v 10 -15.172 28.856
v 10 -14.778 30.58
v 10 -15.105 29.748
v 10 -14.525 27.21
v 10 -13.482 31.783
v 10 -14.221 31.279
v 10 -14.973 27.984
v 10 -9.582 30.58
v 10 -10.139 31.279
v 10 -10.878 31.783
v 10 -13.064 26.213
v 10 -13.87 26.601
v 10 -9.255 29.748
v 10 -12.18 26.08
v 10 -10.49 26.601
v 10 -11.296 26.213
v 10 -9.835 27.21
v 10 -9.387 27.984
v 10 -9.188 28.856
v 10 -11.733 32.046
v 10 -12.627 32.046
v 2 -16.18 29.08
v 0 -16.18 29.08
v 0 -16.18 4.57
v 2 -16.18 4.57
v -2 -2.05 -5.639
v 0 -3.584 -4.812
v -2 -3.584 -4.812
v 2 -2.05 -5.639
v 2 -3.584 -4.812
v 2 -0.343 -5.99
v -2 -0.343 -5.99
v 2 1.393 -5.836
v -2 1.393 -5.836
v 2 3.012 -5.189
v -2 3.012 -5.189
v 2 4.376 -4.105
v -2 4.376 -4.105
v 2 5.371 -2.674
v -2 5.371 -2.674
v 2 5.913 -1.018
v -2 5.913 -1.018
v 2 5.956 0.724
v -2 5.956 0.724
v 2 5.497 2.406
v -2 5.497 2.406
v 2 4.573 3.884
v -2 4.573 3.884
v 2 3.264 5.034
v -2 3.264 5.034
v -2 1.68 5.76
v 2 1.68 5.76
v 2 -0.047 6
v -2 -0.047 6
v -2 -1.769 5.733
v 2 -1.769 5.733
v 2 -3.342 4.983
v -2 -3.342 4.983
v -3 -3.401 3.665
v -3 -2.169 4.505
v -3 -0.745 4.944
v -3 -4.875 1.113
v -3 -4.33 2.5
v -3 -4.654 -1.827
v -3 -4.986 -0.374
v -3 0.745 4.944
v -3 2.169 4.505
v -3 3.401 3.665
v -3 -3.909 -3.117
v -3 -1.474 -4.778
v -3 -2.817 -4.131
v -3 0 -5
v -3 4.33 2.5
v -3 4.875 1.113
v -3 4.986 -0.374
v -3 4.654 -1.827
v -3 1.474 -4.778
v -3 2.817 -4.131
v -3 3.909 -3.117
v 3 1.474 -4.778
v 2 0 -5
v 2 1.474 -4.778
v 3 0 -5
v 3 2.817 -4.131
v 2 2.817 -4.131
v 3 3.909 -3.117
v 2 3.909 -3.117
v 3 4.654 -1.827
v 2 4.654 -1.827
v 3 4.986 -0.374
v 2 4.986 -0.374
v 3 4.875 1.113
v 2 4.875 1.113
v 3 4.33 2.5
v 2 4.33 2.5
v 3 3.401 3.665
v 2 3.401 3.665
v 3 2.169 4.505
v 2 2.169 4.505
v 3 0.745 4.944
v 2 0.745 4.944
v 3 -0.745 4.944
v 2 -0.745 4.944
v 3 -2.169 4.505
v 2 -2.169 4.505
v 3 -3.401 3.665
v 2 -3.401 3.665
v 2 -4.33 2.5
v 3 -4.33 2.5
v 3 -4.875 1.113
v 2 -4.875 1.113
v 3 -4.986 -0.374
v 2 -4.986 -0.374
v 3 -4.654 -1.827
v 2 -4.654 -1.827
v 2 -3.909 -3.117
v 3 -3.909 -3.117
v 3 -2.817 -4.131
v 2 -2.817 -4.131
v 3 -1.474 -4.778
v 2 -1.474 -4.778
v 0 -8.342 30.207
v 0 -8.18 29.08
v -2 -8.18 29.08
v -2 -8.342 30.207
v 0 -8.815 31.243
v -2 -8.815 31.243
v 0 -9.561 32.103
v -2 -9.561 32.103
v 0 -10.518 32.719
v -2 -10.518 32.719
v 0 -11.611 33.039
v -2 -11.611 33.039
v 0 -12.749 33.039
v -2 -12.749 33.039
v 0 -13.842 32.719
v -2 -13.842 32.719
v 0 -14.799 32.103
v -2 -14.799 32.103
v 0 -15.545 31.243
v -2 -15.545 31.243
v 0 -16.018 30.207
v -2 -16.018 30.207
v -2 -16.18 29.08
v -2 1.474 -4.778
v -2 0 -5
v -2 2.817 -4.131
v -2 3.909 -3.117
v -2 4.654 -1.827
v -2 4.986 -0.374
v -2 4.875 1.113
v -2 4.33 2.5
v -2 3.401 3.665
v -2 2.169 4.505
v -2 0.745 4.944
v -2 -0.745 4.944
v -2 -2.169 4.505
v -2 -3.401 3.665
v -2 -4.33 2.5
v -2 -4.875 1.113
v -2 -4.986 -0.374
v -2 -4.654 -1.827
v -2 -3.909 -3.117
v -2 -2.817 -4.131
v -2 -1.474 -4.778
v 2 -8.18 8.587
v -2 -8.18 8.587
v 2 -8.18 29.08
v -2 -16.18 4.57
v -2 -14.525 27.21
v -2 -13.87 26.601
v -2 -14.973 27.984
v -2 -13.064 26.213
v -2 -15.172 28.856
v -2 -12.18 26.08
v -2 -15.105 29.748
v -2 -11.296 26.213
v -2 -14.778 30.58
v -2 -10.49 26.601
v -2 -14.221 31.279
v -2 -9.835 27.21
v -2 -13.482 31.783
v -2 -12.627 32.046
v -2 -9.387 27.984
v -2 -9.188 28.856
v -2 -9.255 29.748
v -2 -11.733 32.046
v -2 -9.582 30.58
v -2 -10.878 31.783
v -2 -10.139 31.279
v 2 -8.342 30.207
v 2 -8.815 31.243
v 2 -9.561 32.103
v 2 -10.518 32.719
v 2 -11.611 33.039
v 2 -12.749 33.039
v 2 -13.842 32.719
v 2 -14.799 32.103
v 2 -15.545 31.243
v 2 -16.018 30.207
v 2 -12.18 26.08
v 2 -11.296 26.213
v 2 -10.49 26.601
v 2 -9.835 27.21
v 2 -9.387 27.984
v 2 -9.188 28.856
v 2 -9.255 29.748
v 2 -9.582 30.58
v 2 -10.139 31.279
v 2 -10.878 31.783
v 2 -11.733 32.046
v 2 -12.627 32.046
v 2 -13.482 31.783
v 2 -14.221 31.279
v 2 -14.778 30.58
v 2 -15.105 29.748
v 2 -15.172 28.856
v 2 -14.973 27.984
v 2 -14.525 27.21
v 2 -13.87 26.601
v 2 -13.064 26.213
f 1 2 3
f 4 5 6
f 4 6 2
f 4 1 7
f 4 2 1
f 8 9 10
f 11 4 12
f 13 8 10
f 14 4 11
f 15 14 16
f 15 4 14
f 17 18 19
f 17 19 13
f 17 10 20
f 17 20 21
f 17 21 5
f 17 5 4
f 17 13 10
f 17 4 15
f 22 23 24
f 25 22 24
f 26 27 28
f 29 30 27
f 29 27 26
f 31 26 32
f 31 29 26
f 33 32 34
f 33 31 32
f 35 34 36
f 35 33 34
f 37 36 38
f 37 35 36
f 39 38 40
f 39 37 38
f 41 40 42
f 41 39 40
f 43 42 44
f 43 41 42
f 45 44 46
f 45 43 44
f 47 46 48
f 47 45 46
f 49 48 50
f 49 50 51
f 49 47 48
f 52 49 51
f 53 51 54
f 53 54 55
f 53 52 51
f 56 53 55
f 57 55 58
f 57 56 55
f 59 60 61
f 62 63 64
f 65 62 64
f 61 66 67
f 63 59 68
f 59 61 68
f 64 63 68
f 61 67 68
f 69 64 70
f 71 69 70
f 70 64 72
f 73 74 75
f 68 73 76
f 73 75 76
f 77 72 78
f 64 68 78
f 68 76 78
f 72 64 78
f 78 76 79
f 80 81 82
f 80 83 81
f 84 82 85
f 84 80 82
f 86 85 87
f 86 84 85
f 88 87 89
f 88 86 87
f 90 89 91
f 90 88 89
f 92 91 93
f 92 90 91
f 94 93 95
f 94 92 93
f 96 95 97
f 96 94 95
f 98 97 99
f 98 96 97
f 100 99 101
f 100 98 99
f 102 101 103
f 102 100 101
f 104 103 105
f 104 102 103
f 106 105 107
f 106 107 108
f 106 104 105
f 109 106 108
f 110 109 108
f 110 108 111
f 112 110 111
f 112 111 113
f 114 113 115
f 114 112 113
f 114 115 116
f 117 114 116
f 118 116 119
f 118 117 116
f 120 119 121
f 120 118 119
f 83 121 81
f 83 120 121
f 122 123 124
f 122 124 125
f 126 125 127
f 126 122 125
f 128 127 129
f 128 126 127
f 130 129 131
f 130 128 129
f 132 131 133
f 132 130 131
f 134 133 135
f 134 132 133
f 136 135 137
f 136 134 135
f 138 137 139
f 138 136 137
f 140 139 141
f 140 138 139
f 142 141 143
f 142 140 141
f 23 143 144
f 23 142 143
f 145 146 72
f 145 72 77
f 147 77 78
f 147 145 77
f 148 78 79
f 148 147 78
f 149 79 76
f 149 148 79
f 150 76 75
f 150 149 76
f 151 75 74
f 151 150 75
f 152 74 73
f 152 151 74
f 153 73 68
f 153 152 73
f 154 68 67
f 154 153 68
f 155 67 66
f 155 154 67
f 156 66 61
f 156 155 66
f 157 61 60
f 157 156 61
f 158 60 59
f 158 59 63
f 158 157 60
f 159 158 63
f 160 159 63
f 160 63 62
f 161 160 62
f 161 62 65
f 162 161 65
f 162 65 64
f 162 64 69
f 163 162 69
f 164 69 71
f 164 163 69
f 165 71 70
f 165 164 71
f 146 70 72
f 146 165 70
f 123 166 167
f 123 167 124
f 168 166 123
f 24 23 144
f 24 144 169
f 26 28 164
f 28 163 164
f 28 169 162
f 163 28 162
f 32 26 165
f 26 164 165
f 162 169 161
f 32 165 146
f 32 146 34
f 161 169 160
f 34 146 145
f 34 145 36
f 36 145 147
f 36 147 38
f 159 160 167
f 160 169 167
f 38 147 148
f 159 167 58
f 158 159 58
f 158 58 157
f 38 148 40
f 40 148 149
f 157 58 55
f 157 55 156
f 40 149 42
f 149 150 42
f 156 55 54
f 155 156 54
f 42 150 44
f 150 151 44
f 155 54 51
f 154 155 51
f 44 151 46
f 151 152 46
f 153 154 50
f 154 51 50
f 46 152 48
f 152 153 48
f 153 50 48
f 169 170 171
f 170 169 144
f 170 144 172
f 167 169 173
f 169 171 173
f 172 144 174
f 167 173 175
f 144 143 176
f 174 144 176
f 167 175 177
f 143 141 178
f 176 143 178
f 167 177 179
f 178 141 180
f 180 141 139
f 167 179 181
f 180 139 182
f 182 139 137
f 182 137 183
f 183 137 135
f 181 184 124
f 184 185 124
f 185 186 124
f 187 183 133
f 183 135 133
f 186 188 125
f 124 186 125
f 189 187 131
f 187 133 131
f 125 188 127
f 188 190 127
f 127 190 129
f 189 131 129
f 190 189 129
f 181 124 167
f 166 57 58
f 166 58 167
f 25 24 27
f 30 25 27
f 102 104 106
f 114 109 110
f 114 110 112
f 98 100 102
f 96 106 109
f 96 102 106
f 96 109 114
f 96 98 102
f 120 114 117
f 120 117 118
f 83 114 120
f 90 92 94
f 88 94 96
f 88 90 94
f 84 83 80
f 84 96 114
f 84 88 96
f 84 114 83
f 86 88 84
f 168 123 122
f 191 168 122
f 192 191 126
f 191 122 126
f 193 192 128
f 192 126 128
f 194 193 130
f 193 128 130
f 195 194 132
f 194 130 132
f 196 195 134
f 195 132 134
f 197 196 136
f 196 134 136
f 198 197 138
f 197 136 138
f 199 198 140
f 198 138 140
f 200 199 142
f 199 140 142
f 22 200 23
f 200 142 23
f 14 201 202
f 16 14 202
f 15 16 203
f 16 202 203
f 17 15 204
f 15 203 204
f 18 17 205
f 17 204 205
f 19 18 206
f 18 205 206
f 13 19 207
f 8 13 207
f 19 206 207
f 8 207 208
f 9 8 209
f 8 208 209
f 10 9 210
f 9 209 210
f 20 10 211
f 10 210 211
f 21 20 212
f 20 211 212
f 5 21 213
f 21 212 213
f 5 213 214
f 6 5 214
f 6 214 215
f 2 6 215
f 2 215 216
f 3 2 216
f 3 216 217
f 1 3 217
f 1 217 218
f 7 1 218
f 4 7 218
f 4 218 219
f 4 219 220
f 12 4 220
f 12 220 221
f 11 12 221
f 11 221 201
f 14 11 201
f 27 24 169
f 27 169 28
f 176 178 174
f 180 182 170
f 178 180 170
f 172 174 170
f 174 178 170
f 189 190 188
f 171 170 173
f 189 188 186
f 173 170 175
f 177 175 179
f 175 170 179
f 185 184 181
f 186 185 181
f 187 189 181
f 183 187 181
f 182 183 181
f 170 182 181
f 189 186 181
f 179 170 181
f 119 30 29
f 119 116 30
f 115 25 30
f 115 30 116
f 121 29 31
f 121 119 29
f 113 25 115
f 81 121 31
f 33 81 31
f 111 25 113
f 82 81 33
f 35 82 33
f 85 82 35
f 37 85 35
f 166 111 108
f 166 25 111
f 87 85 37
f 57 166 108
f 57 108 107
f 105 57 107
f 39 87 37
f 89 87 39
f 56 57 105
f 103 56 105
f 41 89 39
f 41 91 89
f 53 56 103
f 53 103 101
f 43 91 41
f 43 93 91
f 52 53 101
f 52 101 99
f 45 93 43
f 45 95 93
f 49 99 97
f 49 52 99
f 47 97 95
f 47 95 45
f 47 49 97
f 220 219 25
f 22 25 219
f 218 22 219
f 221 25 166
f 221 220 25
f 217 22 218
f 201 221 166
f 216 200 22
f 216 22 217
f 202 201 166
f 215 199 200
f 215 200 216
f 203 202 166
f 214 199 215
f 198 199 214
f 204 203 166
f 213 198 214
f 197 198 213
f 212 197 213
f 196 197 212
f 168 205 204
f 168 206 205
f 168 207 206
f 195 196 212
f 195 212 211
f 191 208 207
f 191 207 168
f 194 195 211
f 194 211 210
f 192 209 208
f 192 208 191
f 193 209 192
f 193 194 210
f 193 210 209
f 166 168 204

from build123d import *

# Parameters (mm, degrees)
SKETCH1_R           = 4
SKETCH1_R_2         = 3
SKETCH1_R_3         = 6
SKETCH1_R_4         = 5
BOSS_EXTRUDE1_DEPTH = 2
SKETCH1_3_R         = 5
BOSS_EXTRUDE2_DEPTH = 3
BOSS_EXTRUDE3_START = -2
SKETCH1_4_R         = 3
BOSS_EXTRUDE3_DEPTH = 12


with BuildPart() as part:
    # Sketch1 → Boss-Extrude1 (new, symmetric)
    # profile 1 of 3: a face of its own
    with BuildSketch(Plane.YZ):
        with BuildLine():
            ThreePointArc((-8.18, 29.08), (-12.18, 25.08), (-16.18, 29.08))
            Line((-16.18, 29.08), (-16.18, 4.569972731))
            Line((-16.18, 4.569972731), (-3.584071428, -4.811905236))
            ThreePointArc((-3.584071428, -4.811905236), (-5.998168777, 0.148227284), (-3.342017287, 4.98306336))
            Line((-3.342017287, 4.98306336), (-8.18, 8.586558185))
            Line((-8.18, 8.586558185), (-8.18, 29.08))
        make_face()
    # profile 2 of 3: a face of its own
    with BuildSketch(Plane.YZ):
        with Locations((-12.18, 29.08)):
            Circle(SKETCH1_R)
        with Locations(Location((-12.18, 29.08, 0), (0, 0, 270))):
            Circle(SKETCH1_R_2, mode=Mode.SUBTRACT)
    # profile 3 of 3: a face of its own
    with BuildSketch(Plane.YZ):
        Circle(SKETCH1_R_3)
        with Locations(Location((0, 0, 0), (0, 0, 270))):
            Circle(SKETCH1_R_4, mode=Mode.SUBTRACT)
    extrude(amount=BOSS_EXTRUDE1_DEPTH, both=True)

    # Sketch1<3> → Boss-Extrude2 (add, symmetric)
    with BuildSketch(Plane.YZ):
        with Locations(Location((0, 0, 0), (0, 0, 270))):
            Circle(SKETCH1_3_R)
    extrude(amount=BOSS_EXTRUDE2_DEPTH, both=True)

    # Sketch1<4> → Boss-Extrude3 (add)
    with BuildSketch(Plane.YZ.offset(BOSS_EXTRUDE3_START)):
        with Locations(Location((-12.18, 29.08, 0), (0, 0, 270))):
            Circle(SKETCH1_4_R)
    extrude(amount=BOSS_EXTRUDE3_DEPTH)


solid = part.part
